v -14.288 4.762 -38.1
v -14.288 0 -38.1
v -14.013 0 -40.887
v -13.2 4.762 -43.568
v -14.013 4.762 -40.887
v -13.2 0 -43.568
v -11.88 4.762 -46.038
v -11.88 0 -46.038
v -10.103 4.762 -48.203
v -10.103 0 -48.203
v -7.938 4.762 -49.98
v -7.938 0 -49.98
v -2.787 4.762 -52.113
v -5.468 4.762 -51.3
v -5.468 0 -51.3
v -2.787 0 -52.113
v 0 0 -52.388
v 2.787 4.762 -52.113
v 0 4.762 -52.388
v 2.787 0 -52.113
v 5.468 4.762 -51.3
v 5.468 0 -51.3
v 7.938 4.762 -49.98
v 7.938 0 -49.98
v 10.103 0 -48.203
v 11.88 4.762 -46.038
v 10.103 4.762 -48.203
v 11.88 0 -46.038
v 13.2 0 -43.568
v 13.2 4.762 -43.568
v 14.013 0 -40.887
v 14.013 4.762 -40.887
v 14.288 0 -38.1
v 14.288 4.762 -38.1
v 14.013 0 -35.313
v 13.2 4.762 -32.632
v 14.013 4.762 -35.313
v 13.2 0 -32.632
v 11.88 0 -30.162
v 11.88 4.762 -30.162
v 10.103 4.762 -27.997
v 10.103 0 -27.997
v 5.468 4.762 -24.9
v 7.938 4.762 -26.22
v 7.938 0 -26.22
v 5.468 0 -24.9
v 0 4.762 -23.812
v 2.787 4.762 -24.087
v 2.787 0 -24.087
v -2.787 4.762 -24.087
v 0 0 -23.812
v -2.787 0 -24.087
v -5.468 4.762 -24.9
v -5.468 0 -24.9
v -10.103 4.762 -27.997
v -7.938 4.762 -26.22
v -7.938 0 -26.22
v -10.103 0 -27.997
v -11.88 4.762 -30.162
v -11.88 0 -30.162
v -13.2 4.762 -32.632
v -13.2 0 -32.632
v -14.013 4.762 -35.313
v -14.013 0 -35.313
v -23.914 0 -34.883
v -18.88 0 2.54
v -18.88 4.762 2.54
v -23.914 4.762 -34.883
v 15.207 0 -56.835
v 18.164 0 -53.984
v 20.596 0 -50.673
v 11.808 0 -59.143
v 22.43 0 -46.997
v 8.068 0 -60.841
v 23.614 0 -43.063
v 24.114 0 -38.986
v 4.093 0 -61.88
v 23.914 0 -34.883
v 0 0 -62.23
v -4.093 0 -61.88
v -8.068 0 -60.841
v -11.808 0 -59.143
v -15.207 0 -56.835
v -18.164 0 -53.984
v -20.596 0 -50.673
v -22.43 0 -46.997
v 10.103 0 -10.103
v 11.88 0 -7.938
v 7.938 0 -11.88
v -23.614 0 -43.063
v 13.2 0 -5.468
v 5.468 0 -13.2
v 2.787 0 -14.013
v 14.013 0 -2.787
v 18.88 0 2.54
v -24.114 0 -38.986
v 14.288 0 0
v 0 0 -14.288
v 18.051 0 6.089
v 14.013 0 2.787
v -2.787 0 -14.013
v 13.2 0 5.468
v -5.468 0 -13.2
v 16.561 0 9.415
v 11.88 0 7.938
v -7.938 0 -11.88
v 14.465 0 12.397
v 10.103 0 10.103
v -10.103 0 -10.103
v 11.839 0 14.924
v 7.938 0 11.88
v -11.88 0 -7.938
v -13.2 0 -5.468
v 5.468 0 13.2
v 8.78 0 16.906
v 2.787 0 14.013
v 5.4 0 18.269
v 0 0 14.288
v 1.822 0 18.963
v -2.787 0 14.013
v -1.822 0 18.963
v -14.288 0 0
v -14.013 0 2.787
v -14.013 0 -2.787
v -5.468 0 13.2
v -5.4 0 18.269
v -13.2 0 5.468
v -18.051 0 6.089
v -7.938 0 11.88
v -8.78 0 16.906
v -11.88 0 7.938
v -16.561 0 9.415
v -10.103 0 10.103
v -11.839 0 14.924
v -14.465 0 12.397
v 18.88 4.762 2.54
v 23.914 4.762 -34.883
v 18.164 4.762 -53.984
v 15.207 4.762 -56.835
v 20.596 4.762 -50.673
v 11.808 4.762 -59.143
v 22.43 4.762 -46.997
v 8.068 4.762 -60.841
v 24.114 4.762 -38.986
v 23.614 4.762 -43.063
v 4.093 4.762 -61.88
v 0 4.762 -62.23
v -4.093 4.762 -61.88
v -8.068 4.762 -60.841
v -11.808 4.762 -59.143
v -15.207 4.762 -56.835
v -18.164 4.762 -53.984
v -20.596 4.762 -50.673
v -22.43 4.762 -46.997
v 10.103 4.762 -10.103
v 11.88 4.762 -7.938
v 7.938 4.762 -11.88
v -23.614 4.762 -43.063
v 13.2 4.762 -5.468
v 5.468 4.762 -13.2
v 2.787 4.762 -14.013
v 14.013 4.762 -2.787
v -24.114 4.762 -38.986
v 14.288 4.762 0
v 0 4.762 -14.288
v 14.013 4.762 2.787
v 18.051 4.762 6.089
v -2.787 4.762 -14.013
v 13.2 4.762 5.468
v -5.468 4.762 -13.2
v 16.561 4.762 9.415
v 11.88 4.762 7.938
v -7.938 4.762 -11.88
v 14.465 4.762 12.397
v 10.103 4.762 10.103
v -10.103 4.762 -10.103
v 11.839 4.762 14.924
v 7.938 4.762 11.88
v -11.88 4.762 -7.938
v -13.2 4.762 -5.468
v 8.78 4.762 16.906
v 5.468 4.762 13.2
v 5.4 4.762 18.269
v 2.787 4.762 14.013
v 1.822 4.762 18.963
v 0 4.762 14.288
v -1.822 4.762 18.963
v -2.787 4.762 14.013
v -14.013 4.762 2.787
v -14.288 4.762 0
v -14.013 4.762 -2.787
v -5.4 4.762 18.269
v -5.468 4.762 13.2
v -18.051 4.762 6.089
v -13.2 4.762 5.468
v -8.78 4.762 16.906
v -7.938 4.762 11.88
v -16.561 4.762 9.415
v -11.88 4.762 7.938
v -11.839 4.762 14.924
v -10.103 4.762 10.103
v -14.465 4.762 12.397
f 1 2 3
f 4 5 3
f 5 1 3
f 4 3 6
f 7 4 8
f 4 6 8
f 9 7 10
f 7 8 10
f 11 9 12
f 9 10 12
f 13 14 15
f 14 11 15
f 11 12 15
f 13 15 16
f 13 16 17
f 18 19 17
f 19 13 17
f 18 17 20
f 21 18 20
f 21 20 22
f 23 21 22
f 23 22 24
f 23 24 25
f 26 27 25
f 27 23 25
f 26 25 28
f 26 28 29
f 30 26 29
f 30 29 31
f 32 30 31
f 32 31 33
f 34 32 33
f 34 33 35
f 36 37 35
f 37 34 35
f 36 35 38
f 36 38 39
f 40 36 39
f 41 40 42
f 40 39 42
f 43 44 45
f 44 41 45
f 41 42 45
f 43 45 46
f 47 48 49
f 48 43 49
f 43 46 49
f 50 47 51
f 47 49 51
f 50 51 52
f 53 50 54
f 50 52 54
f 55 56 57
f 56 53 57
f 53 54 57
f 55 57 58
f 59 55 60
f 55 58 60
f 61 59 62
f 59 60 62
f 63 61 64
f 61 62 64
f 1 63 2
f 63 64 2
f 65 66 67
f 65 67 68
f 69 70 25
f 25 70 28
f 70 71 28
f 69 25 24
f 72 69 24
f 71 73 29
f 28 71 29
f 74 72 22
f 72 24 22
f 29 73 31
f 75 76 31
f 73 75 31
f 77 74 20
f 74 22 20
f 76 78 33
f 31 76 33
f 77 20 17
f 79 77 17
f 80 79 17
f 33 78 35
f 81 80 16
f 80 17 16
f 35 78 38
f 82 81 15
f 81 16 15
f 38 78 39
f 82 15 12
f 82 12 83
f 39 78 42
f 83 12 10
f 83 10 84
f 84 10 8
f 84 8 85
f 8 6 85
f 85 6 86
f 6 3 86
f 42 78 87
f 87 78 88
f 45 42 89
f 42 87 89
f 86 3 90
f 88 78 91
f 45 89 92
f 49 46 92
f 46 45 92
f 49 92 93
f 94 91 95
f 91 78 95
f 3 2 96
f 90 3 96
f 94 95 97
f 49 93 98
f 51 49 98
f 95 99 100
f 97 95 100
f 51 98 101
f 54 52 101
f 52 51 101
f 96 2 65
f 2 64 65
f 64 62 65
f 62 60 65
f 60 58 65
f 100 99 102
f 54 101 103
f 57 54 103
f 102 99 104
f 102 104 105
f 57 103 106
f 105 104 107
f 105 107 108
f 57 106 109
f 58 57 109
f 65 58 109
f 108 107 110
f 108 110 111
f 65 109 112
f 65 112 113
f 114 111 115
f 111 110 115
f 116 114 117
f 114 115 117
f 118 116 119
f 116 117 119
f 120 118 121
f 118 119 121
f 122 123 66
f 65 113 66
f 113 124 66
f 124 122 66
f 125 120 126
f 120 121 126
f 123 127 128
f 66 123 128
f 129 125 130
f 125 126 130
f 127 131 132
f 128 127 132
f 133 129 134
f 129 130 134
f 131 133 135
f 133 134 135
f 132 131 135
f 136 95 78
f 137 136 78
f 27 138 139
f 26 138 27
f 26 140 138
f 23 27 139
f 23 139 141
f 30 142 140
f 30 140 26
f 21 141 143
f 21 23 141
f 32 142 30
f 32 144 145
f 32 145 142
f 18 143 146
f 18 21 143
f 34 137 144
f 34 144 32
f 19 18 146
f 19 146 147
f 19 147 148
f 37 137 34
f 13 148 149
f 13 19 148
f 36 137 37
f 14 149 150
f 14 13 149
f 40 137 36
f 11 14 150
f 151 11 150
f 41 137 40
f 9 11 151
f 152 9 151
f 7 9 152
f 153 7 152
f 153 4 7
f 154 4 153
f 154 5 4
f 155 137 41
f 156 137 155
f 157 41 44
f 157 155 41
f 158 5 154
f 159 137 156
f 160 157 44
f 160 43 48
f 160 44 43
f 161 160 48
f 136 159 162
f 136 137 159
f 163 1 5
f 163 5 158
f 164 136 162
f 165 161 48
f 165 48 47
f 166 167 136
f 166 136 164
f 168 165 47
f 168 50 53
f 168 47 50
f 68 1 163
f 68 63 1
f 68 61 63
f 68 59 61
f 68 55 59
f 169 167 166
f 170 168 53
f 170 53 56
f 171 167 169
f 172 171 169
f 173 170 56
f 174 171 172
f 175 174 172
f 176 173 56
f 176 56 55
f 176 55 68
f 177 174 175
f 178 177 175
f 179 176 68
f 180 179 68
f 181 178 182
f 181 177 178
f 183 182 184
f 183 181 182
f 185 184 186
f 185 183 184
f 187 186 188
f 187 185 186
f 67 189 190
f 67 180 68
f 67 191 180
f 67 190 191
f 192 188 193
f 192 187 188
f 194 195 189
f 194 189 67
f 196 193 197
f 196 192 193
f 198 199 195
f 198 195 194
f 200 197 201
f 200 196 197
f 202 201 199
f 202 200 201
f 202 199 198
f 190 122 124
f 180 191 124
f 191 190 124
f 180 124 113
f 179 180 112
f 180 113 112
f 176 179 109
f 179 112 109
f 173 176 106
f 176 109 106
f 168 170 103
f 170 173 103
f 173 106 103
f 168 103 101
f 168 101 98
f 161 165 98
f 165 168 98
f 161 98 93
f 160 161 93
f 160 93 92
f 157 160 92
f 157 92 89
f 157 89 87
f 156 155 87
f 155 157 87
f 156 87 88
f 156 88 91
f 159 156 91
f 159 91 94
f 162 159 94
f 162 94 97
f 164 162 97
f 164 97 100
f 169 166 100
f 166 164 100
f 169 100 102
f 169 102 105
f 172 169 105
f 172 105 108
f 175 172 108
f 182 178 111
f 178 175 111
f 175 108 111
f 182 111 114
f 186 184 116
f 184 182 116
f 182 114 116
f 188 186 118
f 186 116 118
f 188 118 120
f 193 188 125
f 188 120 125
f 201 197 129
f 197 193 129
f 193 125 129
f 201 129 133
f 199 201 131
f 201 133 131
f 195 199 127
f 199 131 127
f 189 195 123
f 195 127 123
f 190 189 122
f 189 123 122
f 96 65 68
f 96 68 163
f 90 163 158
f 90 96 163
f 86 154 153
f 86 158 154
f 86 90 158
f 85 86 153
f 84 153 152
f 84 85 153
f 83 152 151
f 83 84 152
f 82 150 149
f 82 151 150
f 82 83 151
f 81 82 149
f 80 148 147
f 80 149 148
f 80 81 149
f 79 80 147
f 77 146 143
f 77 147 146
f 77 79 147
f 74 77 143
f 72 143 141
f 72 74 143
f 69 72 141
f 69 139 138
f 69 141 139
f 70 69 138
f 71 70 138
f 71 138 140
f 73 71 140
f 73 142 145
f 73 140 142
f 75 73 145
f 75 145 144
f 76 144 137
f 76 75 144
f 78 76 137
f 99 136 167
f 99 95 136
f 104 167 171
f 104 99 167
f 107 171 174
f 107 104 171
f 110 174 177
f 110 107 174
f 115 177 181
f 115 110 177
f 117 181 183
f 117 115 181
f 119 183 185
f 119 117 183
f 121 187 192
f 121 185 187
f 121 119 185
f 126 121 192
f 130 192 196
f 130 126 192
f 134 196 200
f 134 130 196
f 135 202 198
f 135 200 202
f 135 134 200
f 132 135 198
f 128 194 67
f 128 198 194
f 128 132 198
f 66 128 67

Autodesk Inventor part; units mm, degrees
ref_plane "YZ Plane" through (0, 0, 0) normal (1, 0, 0) x (0, 1, 0)
ref_plane "XZ Plane" through (0, 0, 0) normal (0, 1, 0) x (-1, 0, 0)
ref_plane "XY Plane" through (0, 0, 0) normal (0, 0, 1) x (1, 0, 0)
sketch "Sketch1" plane through (0, 0, 0) normal (0, 1, 0) x (-1, 0, 0)
  circle A0 centre (0, 0) radius 15.24 construction
  circle A1 centre (0, 0) radius 16.51 construction
  circle A2 centre (0, -38.1) radius 22.86 construction
  circle A3 centre (0, -38.1) radius 24.13 construction
  circle A4 centre (0, 0) radius 14.2875
  circle A5 centre (0, -38.1) radius 14.2875
  circle A6 centre (0, 0) radius 19.05 construction
  circle A7 centre (0, -38.1) radius 24.13 construction
  line L0 (18.8799, 2.54) -> (23.9145, -34.8827)
  line L1 (-18.8799, 2.54) -> (-23.9145, -34.8827)
  arc A8 (18.8799, 2.54) -> (-18.8799, 2.54) centre (0, 0) ccw
  arc A9 (-23.9145, -34.8827) -> (23.9145, -34.8827) centre (0, -38.1) ccw
  dimension "d0" = 30.48
  dimension "d2" = 1.27
  dimension "d3" = 45.72
  dimension "d5" = 1.27
  dimension "d6" = 28.575
  dimension "d7" = 4.7625
  dimension "d8" = 1.27
extrude "Extrusion1" add sketch "Sketch1" along normal blind 4.7625
properties part number "Train_006_Gearbox1"
